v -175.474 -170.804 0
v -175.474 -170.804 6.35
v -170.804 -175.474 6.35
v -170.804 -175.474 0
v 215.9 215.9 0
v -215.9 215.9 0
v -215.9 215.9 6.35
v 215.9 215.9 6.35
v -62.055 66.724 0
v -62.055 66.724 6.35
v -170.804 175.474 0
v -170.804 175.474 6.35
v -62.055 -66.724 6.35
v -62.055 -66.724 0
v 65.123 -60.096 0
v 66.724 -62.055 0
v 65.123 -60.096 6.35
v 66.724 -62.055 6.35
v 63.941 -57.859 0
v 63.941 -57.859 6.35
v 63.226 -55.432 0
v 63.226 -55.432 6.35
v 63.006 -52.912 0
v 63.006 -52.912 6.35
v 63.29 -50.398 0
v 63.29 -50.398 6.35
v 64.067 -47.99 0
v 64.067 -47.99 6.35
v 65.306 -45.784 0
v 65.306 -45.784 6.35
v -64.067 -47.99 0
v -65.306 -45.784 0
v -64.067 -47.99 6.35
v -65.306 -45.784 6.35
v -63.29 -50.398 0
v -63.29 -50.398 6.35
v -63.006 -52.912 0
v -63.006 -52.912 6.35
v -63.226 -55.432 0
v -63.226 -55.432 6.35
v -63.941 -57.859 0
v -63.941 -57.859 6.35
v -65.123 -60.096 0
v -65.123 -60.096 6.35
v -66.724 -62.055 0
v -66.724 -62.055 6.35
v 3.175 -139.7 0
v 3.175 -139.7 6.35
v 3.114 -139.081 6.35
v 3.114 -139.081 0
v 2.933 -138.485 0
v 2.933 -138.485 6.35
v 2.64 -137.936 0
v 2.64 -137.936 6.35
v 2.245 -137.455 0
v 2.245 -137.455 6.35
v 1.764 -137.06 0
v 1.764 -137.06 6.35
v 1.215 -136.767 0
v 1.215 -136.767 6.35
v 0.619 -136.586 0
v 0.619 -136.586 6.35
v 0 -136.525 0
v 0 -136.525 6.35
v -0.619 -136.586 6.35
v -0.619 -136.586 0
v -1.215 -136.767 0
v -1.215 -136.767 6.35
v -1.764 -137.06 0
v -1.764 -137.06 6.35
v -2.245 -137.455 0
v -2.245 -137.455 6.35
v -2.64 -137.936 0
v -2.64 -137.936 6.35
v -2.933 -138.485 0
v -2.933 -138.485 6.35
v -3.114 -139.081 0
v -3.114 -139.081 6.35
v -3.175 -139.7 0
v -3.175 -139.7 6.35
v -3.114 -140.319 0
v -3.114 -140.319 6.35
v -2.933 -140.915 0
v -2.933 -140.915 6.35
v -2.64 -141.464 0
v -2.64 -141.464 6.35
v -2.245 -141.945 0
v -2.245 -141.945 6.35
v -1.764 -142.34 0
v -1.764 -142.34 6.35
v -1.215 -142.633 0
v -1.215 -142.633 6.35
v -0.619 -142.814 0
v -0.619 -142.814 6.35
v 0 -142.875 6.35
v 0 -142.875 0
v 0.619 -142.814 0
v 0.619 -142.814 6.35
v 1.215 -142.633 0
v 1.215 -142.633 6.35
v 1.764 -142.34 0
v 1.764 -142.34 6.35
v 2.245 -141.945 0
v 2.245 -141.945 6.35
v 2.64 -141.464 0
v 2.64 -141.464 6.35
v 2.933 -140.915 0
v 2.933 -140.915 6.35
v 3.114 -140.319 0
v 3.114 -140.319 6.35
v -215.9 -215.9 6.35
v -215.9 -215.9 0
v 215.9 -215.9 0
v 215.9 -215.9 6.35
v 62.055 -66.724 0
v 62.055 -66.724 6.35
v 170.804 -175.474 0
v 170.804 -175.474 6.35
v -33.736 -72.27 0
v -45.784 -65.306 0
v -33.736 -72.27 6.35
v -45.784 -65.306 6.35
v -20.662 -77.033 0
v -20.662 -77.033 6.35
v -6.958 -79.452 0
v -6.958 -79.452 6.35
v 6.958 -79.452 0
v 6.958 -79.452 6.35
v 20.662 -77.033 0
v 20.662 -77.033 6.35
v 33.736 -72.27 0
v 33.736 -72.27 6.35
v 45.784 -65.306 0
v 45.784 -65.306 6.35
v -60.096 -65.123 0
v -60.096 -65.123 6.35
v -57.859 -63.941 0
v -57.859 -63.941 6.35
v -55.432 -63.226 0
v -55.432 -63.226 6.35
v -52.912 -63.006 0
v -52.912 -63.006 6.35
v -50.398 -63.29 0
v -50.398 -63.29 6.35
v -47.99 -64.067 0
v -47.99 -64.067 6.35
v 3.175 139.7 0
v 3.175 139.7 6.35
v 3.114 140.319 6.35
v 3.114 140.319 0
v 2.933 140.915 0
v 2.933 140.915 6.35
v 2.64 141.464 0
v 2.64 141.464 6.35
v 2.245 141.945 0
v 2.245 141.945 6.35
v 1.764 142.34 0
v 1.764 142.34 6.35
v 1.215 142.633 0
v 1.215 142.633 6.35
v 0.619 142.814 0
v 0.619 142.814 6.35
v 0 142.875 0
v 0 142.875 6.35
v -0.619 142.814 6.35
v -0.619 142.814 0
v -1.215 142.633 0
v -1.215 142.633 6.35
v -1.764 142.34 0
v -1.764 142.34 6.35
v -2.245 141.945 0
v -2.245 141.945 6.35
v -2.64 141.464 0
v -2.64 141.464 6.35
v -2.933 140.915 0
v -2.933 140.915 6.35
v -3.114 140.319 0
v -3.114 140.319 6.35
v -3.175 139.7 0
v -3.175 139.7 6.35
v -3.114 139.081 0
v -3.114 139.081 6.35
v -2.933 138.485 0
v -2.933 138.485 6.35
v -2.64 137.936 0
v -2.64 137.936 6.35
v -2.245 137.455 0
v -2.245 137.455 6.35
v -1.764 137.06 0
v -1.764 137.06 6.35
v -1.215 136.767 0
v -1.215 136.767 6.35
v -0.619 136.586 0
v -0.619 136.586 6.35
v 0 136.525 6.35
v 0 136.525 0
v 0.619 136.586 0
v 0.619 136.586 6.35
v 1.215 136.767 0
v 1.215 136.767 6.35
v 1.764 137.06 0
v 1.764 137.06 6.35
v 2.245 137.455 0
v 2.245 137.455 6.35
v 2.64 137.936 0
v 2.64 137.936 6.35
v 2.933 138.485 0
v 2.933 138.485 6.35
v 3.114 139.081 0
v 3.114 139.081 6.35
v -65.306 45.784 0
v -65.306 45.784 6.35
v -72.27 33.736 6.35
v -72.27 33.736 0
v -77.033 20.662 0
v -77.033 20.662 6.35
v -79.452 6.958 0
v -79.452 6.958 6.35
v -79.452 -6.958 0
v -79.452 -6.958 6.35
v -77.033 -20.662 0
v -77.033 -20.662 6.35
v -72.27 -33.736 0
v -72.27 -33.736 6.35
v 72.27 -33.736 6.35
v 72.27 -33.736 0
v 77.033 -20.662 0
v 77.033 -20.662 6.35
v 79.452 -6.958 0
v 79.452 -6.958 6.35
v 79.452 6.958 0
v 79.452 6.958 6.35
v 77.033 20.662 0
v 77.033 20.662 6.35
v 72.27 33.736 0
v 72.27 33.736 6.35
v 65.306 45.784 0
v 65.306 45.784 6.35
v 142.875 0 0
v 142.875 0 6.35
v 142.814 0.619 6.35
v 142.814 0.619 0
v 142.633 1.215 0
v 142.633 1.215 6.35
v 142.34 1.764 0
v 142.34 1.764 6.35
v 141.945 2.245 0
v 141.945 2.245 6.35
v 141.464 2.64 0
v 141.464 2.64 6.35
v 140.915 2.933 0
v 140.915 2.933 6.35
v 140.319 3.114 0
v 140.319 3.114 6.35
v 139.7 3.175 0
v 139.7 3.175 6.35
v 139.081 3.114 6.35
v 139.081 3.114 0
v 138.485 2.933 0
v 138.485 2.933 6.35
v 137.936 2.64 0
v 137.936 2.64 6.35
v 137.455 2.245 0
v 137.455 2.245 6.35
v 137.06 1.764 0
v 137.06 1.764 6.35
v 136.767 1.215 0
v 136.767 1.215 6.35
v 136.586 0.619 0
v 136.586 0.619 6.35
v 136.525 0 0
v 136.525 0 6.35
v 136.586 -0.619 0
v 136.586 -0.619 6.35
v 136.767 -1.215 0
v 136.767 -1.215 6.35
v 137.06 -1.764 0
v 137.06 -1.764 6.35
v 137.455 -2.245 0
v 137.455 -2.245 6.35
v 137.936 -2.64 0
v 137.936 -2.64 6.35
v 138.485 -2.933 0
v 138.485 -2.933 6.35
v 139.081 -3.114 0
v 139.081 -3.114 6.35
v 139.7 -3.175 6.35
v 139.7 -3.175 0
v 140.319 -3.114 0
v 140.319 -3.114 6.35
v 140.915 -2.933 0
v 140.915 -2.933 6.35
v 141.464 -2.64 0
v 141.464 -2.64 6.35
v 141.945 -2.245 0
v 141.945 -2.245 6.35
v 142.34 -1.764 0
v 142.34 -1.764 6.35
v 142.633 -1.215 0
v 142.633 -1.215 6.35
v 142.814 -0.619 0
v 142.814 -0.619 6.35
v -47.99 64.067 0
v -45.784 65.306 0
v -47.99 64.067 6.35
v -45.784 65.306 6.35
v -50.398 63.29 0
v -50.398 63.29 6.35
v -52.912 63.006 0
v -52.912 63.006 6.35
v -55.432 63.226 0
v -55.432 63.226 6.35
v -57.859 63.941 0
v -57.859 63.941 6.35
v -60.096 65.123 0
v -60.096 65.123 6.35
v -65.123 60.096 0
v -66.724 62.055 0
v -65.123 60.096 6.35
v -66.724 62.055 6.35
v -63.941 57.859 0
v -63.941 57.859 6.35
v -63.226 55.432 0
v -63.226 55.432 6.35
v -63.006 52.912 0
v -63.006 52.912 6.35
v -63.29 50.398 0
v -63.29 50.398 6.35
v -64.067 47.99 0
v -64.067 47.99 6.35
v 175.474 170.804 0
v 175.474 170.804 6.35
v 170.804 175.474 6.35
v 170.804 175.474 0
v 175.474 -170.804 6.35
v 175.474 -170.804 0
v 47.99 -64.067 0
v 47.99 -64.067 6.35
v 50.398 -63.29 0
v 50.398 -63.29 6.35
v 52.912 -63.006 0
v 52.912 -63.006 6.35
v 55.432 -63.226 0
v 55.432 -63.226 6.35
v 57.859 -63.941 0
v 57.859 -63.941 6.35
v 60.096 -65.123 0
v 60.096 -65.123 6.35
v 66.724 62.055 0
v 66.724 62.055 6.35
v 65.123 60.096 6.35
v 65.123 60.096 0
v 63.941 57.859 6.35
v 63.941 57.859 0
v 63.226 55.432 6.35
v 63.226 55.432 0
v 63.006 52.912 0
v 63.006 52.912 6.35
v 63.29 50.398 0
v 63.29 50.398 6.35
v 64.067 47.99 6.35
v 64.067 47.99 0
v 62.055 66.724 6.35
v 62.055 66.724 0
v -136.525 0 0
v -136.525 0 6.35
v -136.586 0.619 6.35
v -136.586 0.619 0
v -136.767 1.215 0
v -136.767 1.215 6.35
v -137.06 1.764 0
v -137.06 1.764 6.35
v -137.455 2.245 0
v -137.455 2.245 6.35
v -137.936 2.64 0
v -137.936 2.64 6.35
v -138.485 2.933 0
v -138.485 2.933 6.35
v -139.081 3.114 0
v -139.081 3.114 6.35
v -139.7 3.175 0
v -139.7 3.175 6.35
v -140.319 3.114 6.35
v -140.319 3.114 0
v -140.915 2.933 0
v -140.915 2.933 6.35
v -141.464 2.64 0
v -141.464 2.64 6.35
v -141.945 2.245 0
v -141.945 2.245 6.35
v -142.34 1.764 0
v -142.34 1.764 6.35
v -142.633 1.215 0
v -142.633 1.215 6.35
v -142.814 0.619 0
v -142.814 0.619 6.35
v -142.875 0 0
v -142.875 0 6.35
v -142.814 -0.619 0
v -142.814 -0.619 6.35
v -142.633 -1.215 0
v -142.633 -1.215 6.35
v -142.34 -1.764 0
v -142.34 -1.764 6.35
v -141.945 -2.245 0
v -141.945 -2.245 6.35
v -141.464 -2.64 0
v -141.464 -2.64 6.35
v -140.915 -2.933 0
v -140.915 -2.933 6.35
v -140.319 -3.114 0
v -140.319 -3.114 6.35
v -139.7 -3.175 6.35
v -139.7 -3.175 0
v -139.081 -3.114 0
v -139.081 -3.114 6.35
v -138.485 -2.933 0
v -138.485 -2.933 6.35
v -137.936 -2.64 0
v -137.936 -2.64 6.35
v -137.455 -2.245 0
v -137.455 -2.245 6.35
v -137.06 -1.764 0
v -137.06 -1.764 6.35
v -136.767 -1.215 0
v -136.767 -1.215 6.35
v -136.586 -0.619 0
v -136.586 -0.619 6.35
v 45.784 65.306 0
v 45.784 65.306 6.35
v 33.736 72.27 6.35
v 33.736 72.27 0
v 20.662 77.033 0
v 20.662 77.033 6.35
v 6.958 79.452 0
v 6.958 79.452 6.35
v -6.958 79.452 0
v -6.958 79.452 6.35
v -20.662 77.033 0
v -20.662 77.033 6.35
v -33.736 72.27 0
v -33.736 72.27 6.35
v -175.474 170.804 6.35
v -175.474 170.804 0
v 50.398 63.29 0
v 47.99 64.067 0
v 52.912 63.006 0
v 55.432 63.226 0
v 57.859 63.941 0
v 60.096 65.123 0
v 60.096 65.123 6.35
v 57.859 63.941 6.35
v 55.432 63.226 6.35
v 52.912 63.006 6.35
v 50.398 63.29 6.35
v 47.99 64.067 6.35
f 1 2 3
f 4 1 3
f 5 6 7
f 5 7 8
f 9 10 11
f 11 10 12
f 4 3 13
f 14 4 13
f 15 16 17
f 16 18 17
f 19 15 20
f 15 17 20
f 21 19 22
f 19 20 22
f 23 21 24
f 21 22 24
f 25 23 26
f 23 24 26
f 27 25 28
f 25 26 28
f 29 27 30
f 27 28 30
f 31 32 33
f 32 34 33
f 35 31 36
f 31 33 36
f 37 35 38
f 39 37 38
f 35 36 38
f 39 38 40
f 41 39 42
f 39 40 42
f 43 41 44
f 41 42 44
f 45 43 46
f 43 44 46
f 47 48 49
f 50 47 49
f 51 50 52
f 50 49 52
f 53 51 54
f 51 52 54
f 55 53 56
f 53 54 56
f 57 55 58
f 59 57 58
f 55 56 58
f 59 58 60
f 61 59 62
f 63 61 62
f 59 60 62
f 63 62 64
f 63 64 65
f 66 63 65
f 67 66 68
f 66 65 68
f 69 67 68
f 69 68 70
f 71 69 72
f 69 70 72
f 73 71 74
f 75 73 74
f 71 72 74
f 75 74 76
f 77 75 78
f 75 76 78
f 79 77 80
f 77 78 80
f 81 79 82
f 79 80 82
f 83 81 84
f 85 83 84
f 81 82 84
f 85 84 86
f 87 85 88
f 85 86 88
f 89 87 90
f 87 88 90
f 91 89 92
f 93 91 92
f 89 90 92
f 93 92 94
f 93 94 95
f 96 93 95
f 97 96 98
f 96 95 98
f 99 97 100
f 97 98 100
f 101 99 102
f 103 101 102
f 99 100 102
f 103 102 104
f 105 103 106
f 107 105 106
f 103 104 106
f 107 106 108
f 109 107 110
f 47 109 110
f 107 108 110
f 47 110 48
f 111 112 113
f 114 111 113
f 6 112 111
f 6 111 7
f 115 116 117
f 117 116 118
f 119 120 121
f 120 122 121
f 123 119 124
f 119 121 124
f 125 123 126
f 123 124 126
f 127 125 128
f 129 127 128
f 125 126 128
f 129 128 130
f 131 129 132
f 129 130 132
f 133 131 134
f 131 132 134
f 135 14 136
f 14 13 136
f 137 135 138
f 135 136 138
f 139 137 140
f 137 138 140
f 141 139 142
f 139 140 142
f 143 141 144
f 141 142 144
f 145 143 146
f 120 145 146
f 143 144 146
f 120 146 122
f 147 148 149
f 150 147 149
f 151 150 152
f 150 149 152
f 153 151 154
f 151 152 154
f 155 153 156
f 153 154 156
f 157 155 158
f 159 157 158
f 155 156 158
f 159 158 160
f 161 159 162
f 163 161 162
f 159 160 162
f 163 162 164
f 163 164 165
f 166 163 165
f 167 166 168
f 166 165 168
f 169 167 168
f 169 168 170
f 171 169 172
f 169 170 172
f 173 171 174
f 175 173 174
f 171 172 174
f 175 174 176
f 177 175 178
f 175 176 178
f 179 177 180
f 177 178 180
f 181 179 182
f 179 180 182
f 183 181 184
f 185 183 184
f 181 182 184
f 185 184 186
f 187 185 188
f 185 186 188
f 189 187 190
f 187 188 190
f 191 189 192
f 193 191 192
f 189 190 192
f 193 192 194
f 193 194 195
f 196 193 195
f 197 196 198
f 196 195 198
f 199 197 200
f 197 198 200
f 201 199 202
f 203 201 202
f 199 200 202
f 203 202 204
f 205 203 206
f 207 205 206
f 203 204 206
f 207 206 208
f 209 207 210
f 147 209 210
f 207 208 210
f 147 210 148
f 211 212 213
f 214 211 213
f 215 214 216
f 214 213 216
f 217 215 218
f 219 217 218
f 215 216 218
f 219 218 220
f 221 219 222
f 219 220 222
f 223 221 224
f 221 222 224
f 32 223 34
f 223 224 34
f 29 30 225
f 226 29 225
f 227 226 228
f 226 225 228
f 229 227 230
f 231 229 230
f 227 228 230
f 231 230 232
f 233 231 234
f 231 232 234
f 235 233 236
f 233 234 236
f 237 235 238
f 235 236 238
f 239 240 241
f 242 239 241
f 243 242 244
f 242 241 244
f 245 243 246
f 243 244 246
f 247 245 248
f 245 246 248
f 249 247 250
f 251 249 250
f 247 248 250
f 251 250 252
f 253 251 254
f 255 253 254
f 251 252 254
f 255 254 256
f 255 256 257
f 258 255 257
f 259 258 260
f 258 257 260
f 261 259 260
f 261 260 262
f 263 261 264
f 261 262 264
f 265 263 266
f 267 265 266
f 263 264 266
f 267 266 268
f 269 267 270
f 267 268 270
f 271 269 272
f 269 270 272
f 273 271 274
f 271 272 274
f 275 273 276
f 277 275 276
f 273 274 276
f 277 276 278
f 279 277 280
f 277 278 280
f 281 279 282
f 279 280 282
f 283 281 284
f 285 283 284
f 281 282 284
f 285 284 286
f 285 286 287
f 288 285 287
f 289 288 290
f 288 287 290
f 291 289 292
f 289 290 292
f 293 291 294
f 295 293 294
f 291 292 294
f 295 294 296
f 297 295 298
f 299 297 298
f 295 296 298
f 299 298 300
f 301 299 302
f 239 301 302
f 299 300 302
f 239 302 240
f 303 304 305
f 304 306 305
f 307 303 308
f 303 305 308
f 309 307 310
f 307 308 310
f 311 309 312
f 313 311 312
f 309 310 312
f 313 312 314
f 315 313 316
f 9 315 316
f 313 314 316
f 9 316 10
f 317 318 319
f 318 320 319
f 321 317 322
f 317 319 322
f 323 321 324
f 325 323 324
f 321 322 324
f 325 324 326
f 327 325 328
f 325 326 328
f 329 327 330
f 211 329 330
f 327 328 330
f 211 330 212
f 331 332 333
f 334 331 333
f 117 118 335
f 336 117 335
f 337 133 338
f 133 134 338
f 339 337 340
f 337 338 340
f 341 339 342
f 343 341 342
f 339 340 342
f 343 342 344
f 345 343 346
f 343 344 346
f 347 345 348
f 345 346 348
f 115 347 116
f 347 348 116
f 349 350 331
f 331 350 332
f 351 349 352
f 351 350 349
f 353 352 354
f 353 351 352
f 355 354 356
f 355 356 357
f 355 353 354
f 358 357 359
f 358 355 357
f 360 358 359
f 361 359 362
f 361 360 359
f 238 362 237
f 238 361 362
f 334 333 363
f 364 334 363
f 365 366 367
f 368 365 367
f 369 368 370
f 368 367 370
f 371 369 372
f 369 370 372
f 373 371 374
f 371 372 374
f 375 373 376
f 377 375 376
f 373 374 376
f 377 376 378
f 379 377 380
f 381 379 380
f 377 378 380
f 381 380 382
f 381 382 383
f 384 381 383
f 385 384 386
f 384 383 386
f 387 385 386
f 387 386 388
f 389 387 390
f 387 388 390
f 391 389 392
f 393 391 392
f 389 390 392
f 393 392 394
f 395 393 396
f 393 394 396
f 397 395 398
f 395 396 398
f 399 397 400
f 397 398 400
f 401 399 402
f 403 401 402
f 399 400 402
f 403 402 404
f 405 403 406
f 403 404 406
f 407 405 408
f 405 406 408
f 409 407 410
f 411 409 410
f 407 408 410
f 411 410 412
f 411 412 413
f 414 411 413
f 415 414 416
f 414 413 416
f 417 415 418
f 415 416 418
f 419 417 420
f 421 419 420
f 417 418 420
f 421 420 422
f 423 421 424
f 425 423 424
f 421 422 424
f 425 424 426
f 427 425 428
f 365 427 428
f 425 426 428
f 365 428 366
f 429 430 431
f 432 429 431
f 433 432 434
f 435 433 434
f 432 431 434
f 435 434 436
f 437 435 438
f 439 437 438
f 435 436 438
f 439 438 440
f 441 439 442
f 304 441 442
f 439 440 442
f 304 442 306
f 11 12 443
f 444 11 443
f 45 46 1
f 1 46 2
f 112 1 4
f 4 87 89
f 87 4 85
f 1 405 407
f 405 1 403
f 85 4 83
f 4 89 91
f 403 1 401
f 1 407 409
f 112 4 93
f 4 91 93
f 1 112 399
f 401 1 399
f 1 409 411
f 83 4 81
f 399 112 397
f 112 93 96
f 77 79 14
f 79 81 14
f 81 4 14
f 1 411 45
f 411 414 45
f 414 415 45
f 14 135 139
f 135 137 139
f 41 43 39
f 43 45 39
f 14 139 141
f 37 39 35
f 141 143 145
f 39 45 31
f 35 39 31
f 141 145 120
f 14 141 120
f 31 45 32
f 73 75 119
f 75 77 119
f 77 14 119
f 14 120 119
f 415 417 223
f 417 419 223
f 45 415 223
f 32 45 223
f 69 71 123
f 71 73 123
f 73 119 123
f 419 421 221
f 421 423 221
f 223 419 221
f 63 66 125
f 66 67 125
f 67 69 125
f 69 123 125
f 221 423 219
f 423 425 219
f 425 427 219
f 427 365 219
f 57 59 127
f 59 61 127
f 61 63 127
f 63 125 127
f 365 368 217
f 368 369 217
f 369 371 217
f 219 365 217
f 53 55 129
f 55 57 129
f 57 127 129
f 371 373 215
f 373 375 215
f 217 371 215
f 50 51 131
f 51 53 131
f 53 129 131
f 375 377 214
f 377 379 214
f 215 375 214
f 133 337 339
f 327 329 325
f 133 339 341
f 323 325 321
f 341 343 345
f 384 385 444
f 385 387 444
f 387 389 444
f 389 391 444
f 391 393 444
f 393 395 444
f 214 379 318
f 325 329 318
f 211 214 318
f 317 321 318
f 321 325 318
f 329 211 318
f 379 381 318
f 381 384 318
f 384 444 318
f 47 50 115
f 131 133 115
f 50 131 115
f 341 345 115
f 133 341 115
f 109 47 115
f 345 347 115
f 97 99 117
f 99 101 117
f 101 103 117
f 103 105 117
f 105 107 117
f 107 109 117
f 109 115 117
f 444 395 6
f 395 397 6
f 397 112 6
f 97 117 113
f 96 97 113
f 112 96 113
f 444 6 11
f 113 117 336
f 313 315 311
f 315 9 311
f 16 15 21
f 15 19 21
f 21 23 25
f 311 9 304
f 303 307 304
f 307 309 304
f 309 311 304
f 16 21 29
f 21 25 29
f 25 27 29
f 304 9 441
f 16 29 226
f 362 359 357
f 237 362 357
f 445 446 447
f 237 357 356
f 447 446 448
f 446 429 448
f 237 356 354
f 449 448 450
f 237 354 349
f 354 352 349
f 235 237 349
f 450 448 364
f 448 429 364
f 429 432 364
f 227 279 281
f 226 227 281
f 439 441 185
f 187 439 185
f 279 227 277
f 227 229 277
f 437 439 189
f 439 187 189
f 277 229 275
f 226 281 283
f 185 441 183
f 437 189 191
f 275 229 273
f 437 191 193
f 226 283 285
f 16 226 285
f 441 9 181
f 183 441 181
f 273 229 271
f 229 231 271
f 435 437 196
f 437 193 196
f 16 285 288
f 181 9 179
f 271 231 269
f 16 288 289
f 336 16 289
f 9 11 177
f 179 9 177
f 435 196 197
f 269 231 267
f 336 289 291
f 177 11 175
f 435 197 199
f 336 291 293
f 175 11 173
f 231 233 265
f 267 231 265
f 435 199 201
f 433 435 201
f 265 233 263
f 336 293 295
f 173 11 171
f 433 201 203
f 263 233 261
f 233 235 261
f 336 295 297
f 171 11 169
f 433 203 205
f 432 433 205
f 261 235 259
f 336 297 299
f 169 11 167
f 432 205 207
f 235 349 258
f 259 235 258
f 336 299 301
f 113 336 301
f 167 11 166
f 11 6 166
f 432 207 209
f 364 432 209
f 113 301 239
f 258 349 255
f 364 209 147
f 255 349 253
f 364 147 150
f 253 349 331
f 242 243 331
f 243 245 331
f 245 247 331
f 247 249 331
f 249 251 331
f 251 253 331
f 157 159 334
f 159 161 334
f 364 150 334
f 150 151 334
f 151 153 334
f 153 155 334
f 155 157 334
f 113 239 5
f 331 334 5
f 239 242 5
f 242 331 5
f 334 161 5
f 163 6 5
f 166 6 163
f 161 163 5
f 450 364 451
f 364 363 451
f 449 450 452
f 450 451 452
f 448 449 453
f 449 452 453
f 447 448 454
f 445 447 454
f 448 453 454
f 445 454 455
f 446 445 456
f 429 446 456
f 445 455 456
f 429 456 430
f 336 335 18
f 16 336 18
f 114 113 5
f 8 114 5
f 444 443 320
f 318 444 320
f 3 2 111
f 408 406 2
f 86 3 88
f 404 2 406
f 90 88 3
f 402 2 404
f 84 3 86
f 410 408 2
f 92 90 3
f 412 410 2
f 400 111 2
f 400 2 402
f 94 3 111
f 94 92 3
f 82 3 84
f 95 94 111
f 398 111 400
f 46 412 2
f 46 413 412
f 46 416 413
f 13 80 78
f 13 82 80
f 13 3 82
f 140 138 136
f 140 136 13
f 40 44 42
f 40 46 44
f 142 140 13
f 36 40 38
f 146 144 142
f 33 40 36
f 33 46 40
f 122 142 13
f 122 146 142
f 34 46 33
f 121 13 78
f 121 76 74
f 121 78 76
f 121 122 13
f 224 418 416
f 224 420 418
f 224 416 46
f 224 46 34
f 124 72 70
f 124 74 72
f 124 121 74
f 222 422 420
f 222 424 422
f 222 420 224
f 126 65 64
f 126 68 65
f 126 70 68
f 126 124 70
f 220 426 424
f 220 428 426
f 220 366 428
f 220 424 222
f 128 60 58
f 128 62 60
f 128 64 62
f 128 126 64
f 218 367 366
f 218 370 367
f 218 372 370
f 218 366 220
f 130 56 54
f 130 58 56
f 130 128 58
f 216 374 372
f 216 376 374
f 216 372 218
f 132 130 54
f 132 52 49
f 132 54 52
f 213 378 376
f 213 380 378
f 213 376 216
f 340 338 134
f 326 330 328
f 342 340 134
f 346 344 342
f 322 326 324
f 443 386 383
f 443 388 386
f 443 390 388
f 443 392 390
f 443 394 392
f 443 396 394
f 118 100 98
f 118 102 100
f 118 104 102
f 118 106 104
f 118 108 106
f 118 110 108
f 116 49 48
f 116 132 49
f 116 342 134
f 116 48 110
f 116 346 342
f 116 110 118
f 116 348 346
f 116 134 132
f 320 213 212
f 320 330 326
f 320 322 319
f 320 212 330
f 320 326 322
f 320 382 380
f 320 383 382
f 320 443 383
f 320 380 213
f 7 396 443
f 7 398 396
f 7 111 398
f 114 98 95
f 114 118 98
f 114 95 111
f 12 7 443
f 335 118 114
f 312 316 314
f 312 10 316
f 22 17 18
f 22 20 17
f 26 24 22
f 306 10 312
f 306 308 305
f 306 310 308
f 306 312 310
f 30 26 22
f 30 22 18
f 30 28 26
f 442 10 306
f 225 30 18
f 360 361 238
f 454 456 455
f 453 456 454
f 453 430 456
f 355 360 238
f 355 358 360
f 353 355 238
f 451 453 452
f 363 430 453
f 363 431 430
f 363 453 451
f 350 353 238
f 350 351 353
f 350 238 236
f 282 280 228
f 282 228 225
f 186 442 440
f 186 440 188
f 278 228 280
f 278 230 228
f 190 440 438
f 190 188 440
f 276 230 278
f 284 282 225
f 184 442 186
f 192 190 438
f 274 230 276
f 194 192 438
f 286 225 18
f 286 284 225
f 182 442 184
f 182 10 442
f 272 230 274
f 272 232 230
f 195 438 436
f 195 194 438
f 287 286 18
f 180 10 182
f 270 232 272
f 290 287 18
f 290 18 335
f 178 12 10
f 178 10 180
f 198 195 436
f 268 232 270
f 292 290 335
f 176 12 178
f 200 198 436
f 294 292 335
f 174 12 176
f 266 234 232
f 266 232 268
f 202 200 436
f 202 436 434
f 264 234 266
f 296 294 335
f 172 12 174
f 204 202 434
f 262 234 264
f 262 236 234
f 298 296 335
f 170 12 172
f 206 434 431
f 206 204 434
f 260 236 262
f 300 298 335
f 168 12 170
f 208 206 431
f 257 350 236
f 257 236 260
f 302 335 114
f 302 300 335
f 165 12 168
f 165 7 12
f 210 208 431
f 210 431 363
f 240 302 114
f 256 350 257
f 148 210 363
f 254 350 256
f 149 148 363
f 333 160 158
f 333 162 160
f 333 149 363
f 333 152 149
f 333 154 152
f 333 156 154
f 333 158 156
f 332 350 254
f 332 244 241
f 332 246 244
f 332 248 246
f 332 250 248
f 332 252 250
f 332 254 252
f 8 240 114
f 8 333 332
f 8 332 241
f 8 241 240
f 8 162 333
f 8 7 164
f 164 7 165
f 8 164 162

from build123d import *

# Parameters (mm, degrees)
SKETCH1_W           = 431.8
SKETCH1_H           = 431.8
BOSS_EXTRUDE1_DEPTH = 6.35
SKETCH2_R           = 79.756
CUT_EXTRUDE1_DEPTH  = 6.35
CUT_EXTRUDE2_DEPTH  = 6.35
FILLET1_R           = 12.7
SKETCH4_R           = 3.175
CUT_EXTRUDE3_DEPTH  = 6.35


with BuildPart() as part:
    # Sketch1 → Boss-Extrude1 (new body)
    with BuildSketch(Plane.XY):
        Rectangle(SKETCH1_W, SKETCH1_H)
    extrude(amount=BOSS_EXTRUDE1_DEPTH)

    # Sketch2 → Cut-Extrude1 (cut)
    with BuildSketch(Plane.XY.offset(6.35)):
        Circle(SKETCH2_R)
    extrude(amount=-CUT_EXTRUDE1_DEPTH, mode=Mode.SUBTRACT)

    # Sketch3 → Cut-Extrude2 (cut)
    with BuildSketch(Plane.XY.offset(6.35)):
        Polygon((-170.804471423, 175.474204606), (-175.474204606, 170.804471423), (-55.532184739, 50.862451556), (-50.862451556, 55.532184739), align=None)
        Polygon((175.474204606, 170.804471423), (170.804471423, 175.474204606), (50.862451556, 55.532184739), (55.532184739, 50.862451556), align=None)
        Polygon((170.804471423, -175.474204606), (175.474204606, -170.804471423), (55.532184739, -50.862451556), (50.862451556, -55.532184739), align=None)
        Polygon((-175.474204606, -170.804471423), (-170.804471423, -175.474204606), (-50.862451556, -55.532184739), (-55.532184739, -50.862451556), align=None)
    extrude(amount=-CUT_EXTRUDE2_DEPTH, mode=Mode.SUBTRACT)

    # Fillet1
    fillet1_edges = [part.edges().sort_by_distance(p)[0] for p in [
        (-54.012787894, 58.682521077, 3.175),
        (-58.682521077, 54.012787894, 3.175),
        (58.682521077, 54.012787894, 3.175),
        (54.012787894, 58.682521077, 3.175),
        (54.012787894, -58.682521077, 3.175),
        (58.682521077, -54.012787894, 3.175),
        (-58.682521077, -54.012787894, 3.175),
        (-54.012787894, -58.682521077, 3.175),
    ]]
    fillet(fillet1_edges, radius=FILLET1_R)

    # Sketch4 → Cut-Extrude3 (cut)
    with BuildSketch(Plane.XY.offset(6.35)):
        with Locations((0, 139.7)):
            Circle(SKETCH4_R)
        with Locations((139.7, 0)):
            Circle(SKETCH4_R)
        with Locations((0, -139.7)):
            Circle(SKETCH4_R)
        with Locations((-139.7, 0)):
            Circle(SKETCH4_R)
    extrude(amount=-CUT_EXTRUDE3_DEPTH, mode=Mode.SUBTRACT)


solid = part.part
